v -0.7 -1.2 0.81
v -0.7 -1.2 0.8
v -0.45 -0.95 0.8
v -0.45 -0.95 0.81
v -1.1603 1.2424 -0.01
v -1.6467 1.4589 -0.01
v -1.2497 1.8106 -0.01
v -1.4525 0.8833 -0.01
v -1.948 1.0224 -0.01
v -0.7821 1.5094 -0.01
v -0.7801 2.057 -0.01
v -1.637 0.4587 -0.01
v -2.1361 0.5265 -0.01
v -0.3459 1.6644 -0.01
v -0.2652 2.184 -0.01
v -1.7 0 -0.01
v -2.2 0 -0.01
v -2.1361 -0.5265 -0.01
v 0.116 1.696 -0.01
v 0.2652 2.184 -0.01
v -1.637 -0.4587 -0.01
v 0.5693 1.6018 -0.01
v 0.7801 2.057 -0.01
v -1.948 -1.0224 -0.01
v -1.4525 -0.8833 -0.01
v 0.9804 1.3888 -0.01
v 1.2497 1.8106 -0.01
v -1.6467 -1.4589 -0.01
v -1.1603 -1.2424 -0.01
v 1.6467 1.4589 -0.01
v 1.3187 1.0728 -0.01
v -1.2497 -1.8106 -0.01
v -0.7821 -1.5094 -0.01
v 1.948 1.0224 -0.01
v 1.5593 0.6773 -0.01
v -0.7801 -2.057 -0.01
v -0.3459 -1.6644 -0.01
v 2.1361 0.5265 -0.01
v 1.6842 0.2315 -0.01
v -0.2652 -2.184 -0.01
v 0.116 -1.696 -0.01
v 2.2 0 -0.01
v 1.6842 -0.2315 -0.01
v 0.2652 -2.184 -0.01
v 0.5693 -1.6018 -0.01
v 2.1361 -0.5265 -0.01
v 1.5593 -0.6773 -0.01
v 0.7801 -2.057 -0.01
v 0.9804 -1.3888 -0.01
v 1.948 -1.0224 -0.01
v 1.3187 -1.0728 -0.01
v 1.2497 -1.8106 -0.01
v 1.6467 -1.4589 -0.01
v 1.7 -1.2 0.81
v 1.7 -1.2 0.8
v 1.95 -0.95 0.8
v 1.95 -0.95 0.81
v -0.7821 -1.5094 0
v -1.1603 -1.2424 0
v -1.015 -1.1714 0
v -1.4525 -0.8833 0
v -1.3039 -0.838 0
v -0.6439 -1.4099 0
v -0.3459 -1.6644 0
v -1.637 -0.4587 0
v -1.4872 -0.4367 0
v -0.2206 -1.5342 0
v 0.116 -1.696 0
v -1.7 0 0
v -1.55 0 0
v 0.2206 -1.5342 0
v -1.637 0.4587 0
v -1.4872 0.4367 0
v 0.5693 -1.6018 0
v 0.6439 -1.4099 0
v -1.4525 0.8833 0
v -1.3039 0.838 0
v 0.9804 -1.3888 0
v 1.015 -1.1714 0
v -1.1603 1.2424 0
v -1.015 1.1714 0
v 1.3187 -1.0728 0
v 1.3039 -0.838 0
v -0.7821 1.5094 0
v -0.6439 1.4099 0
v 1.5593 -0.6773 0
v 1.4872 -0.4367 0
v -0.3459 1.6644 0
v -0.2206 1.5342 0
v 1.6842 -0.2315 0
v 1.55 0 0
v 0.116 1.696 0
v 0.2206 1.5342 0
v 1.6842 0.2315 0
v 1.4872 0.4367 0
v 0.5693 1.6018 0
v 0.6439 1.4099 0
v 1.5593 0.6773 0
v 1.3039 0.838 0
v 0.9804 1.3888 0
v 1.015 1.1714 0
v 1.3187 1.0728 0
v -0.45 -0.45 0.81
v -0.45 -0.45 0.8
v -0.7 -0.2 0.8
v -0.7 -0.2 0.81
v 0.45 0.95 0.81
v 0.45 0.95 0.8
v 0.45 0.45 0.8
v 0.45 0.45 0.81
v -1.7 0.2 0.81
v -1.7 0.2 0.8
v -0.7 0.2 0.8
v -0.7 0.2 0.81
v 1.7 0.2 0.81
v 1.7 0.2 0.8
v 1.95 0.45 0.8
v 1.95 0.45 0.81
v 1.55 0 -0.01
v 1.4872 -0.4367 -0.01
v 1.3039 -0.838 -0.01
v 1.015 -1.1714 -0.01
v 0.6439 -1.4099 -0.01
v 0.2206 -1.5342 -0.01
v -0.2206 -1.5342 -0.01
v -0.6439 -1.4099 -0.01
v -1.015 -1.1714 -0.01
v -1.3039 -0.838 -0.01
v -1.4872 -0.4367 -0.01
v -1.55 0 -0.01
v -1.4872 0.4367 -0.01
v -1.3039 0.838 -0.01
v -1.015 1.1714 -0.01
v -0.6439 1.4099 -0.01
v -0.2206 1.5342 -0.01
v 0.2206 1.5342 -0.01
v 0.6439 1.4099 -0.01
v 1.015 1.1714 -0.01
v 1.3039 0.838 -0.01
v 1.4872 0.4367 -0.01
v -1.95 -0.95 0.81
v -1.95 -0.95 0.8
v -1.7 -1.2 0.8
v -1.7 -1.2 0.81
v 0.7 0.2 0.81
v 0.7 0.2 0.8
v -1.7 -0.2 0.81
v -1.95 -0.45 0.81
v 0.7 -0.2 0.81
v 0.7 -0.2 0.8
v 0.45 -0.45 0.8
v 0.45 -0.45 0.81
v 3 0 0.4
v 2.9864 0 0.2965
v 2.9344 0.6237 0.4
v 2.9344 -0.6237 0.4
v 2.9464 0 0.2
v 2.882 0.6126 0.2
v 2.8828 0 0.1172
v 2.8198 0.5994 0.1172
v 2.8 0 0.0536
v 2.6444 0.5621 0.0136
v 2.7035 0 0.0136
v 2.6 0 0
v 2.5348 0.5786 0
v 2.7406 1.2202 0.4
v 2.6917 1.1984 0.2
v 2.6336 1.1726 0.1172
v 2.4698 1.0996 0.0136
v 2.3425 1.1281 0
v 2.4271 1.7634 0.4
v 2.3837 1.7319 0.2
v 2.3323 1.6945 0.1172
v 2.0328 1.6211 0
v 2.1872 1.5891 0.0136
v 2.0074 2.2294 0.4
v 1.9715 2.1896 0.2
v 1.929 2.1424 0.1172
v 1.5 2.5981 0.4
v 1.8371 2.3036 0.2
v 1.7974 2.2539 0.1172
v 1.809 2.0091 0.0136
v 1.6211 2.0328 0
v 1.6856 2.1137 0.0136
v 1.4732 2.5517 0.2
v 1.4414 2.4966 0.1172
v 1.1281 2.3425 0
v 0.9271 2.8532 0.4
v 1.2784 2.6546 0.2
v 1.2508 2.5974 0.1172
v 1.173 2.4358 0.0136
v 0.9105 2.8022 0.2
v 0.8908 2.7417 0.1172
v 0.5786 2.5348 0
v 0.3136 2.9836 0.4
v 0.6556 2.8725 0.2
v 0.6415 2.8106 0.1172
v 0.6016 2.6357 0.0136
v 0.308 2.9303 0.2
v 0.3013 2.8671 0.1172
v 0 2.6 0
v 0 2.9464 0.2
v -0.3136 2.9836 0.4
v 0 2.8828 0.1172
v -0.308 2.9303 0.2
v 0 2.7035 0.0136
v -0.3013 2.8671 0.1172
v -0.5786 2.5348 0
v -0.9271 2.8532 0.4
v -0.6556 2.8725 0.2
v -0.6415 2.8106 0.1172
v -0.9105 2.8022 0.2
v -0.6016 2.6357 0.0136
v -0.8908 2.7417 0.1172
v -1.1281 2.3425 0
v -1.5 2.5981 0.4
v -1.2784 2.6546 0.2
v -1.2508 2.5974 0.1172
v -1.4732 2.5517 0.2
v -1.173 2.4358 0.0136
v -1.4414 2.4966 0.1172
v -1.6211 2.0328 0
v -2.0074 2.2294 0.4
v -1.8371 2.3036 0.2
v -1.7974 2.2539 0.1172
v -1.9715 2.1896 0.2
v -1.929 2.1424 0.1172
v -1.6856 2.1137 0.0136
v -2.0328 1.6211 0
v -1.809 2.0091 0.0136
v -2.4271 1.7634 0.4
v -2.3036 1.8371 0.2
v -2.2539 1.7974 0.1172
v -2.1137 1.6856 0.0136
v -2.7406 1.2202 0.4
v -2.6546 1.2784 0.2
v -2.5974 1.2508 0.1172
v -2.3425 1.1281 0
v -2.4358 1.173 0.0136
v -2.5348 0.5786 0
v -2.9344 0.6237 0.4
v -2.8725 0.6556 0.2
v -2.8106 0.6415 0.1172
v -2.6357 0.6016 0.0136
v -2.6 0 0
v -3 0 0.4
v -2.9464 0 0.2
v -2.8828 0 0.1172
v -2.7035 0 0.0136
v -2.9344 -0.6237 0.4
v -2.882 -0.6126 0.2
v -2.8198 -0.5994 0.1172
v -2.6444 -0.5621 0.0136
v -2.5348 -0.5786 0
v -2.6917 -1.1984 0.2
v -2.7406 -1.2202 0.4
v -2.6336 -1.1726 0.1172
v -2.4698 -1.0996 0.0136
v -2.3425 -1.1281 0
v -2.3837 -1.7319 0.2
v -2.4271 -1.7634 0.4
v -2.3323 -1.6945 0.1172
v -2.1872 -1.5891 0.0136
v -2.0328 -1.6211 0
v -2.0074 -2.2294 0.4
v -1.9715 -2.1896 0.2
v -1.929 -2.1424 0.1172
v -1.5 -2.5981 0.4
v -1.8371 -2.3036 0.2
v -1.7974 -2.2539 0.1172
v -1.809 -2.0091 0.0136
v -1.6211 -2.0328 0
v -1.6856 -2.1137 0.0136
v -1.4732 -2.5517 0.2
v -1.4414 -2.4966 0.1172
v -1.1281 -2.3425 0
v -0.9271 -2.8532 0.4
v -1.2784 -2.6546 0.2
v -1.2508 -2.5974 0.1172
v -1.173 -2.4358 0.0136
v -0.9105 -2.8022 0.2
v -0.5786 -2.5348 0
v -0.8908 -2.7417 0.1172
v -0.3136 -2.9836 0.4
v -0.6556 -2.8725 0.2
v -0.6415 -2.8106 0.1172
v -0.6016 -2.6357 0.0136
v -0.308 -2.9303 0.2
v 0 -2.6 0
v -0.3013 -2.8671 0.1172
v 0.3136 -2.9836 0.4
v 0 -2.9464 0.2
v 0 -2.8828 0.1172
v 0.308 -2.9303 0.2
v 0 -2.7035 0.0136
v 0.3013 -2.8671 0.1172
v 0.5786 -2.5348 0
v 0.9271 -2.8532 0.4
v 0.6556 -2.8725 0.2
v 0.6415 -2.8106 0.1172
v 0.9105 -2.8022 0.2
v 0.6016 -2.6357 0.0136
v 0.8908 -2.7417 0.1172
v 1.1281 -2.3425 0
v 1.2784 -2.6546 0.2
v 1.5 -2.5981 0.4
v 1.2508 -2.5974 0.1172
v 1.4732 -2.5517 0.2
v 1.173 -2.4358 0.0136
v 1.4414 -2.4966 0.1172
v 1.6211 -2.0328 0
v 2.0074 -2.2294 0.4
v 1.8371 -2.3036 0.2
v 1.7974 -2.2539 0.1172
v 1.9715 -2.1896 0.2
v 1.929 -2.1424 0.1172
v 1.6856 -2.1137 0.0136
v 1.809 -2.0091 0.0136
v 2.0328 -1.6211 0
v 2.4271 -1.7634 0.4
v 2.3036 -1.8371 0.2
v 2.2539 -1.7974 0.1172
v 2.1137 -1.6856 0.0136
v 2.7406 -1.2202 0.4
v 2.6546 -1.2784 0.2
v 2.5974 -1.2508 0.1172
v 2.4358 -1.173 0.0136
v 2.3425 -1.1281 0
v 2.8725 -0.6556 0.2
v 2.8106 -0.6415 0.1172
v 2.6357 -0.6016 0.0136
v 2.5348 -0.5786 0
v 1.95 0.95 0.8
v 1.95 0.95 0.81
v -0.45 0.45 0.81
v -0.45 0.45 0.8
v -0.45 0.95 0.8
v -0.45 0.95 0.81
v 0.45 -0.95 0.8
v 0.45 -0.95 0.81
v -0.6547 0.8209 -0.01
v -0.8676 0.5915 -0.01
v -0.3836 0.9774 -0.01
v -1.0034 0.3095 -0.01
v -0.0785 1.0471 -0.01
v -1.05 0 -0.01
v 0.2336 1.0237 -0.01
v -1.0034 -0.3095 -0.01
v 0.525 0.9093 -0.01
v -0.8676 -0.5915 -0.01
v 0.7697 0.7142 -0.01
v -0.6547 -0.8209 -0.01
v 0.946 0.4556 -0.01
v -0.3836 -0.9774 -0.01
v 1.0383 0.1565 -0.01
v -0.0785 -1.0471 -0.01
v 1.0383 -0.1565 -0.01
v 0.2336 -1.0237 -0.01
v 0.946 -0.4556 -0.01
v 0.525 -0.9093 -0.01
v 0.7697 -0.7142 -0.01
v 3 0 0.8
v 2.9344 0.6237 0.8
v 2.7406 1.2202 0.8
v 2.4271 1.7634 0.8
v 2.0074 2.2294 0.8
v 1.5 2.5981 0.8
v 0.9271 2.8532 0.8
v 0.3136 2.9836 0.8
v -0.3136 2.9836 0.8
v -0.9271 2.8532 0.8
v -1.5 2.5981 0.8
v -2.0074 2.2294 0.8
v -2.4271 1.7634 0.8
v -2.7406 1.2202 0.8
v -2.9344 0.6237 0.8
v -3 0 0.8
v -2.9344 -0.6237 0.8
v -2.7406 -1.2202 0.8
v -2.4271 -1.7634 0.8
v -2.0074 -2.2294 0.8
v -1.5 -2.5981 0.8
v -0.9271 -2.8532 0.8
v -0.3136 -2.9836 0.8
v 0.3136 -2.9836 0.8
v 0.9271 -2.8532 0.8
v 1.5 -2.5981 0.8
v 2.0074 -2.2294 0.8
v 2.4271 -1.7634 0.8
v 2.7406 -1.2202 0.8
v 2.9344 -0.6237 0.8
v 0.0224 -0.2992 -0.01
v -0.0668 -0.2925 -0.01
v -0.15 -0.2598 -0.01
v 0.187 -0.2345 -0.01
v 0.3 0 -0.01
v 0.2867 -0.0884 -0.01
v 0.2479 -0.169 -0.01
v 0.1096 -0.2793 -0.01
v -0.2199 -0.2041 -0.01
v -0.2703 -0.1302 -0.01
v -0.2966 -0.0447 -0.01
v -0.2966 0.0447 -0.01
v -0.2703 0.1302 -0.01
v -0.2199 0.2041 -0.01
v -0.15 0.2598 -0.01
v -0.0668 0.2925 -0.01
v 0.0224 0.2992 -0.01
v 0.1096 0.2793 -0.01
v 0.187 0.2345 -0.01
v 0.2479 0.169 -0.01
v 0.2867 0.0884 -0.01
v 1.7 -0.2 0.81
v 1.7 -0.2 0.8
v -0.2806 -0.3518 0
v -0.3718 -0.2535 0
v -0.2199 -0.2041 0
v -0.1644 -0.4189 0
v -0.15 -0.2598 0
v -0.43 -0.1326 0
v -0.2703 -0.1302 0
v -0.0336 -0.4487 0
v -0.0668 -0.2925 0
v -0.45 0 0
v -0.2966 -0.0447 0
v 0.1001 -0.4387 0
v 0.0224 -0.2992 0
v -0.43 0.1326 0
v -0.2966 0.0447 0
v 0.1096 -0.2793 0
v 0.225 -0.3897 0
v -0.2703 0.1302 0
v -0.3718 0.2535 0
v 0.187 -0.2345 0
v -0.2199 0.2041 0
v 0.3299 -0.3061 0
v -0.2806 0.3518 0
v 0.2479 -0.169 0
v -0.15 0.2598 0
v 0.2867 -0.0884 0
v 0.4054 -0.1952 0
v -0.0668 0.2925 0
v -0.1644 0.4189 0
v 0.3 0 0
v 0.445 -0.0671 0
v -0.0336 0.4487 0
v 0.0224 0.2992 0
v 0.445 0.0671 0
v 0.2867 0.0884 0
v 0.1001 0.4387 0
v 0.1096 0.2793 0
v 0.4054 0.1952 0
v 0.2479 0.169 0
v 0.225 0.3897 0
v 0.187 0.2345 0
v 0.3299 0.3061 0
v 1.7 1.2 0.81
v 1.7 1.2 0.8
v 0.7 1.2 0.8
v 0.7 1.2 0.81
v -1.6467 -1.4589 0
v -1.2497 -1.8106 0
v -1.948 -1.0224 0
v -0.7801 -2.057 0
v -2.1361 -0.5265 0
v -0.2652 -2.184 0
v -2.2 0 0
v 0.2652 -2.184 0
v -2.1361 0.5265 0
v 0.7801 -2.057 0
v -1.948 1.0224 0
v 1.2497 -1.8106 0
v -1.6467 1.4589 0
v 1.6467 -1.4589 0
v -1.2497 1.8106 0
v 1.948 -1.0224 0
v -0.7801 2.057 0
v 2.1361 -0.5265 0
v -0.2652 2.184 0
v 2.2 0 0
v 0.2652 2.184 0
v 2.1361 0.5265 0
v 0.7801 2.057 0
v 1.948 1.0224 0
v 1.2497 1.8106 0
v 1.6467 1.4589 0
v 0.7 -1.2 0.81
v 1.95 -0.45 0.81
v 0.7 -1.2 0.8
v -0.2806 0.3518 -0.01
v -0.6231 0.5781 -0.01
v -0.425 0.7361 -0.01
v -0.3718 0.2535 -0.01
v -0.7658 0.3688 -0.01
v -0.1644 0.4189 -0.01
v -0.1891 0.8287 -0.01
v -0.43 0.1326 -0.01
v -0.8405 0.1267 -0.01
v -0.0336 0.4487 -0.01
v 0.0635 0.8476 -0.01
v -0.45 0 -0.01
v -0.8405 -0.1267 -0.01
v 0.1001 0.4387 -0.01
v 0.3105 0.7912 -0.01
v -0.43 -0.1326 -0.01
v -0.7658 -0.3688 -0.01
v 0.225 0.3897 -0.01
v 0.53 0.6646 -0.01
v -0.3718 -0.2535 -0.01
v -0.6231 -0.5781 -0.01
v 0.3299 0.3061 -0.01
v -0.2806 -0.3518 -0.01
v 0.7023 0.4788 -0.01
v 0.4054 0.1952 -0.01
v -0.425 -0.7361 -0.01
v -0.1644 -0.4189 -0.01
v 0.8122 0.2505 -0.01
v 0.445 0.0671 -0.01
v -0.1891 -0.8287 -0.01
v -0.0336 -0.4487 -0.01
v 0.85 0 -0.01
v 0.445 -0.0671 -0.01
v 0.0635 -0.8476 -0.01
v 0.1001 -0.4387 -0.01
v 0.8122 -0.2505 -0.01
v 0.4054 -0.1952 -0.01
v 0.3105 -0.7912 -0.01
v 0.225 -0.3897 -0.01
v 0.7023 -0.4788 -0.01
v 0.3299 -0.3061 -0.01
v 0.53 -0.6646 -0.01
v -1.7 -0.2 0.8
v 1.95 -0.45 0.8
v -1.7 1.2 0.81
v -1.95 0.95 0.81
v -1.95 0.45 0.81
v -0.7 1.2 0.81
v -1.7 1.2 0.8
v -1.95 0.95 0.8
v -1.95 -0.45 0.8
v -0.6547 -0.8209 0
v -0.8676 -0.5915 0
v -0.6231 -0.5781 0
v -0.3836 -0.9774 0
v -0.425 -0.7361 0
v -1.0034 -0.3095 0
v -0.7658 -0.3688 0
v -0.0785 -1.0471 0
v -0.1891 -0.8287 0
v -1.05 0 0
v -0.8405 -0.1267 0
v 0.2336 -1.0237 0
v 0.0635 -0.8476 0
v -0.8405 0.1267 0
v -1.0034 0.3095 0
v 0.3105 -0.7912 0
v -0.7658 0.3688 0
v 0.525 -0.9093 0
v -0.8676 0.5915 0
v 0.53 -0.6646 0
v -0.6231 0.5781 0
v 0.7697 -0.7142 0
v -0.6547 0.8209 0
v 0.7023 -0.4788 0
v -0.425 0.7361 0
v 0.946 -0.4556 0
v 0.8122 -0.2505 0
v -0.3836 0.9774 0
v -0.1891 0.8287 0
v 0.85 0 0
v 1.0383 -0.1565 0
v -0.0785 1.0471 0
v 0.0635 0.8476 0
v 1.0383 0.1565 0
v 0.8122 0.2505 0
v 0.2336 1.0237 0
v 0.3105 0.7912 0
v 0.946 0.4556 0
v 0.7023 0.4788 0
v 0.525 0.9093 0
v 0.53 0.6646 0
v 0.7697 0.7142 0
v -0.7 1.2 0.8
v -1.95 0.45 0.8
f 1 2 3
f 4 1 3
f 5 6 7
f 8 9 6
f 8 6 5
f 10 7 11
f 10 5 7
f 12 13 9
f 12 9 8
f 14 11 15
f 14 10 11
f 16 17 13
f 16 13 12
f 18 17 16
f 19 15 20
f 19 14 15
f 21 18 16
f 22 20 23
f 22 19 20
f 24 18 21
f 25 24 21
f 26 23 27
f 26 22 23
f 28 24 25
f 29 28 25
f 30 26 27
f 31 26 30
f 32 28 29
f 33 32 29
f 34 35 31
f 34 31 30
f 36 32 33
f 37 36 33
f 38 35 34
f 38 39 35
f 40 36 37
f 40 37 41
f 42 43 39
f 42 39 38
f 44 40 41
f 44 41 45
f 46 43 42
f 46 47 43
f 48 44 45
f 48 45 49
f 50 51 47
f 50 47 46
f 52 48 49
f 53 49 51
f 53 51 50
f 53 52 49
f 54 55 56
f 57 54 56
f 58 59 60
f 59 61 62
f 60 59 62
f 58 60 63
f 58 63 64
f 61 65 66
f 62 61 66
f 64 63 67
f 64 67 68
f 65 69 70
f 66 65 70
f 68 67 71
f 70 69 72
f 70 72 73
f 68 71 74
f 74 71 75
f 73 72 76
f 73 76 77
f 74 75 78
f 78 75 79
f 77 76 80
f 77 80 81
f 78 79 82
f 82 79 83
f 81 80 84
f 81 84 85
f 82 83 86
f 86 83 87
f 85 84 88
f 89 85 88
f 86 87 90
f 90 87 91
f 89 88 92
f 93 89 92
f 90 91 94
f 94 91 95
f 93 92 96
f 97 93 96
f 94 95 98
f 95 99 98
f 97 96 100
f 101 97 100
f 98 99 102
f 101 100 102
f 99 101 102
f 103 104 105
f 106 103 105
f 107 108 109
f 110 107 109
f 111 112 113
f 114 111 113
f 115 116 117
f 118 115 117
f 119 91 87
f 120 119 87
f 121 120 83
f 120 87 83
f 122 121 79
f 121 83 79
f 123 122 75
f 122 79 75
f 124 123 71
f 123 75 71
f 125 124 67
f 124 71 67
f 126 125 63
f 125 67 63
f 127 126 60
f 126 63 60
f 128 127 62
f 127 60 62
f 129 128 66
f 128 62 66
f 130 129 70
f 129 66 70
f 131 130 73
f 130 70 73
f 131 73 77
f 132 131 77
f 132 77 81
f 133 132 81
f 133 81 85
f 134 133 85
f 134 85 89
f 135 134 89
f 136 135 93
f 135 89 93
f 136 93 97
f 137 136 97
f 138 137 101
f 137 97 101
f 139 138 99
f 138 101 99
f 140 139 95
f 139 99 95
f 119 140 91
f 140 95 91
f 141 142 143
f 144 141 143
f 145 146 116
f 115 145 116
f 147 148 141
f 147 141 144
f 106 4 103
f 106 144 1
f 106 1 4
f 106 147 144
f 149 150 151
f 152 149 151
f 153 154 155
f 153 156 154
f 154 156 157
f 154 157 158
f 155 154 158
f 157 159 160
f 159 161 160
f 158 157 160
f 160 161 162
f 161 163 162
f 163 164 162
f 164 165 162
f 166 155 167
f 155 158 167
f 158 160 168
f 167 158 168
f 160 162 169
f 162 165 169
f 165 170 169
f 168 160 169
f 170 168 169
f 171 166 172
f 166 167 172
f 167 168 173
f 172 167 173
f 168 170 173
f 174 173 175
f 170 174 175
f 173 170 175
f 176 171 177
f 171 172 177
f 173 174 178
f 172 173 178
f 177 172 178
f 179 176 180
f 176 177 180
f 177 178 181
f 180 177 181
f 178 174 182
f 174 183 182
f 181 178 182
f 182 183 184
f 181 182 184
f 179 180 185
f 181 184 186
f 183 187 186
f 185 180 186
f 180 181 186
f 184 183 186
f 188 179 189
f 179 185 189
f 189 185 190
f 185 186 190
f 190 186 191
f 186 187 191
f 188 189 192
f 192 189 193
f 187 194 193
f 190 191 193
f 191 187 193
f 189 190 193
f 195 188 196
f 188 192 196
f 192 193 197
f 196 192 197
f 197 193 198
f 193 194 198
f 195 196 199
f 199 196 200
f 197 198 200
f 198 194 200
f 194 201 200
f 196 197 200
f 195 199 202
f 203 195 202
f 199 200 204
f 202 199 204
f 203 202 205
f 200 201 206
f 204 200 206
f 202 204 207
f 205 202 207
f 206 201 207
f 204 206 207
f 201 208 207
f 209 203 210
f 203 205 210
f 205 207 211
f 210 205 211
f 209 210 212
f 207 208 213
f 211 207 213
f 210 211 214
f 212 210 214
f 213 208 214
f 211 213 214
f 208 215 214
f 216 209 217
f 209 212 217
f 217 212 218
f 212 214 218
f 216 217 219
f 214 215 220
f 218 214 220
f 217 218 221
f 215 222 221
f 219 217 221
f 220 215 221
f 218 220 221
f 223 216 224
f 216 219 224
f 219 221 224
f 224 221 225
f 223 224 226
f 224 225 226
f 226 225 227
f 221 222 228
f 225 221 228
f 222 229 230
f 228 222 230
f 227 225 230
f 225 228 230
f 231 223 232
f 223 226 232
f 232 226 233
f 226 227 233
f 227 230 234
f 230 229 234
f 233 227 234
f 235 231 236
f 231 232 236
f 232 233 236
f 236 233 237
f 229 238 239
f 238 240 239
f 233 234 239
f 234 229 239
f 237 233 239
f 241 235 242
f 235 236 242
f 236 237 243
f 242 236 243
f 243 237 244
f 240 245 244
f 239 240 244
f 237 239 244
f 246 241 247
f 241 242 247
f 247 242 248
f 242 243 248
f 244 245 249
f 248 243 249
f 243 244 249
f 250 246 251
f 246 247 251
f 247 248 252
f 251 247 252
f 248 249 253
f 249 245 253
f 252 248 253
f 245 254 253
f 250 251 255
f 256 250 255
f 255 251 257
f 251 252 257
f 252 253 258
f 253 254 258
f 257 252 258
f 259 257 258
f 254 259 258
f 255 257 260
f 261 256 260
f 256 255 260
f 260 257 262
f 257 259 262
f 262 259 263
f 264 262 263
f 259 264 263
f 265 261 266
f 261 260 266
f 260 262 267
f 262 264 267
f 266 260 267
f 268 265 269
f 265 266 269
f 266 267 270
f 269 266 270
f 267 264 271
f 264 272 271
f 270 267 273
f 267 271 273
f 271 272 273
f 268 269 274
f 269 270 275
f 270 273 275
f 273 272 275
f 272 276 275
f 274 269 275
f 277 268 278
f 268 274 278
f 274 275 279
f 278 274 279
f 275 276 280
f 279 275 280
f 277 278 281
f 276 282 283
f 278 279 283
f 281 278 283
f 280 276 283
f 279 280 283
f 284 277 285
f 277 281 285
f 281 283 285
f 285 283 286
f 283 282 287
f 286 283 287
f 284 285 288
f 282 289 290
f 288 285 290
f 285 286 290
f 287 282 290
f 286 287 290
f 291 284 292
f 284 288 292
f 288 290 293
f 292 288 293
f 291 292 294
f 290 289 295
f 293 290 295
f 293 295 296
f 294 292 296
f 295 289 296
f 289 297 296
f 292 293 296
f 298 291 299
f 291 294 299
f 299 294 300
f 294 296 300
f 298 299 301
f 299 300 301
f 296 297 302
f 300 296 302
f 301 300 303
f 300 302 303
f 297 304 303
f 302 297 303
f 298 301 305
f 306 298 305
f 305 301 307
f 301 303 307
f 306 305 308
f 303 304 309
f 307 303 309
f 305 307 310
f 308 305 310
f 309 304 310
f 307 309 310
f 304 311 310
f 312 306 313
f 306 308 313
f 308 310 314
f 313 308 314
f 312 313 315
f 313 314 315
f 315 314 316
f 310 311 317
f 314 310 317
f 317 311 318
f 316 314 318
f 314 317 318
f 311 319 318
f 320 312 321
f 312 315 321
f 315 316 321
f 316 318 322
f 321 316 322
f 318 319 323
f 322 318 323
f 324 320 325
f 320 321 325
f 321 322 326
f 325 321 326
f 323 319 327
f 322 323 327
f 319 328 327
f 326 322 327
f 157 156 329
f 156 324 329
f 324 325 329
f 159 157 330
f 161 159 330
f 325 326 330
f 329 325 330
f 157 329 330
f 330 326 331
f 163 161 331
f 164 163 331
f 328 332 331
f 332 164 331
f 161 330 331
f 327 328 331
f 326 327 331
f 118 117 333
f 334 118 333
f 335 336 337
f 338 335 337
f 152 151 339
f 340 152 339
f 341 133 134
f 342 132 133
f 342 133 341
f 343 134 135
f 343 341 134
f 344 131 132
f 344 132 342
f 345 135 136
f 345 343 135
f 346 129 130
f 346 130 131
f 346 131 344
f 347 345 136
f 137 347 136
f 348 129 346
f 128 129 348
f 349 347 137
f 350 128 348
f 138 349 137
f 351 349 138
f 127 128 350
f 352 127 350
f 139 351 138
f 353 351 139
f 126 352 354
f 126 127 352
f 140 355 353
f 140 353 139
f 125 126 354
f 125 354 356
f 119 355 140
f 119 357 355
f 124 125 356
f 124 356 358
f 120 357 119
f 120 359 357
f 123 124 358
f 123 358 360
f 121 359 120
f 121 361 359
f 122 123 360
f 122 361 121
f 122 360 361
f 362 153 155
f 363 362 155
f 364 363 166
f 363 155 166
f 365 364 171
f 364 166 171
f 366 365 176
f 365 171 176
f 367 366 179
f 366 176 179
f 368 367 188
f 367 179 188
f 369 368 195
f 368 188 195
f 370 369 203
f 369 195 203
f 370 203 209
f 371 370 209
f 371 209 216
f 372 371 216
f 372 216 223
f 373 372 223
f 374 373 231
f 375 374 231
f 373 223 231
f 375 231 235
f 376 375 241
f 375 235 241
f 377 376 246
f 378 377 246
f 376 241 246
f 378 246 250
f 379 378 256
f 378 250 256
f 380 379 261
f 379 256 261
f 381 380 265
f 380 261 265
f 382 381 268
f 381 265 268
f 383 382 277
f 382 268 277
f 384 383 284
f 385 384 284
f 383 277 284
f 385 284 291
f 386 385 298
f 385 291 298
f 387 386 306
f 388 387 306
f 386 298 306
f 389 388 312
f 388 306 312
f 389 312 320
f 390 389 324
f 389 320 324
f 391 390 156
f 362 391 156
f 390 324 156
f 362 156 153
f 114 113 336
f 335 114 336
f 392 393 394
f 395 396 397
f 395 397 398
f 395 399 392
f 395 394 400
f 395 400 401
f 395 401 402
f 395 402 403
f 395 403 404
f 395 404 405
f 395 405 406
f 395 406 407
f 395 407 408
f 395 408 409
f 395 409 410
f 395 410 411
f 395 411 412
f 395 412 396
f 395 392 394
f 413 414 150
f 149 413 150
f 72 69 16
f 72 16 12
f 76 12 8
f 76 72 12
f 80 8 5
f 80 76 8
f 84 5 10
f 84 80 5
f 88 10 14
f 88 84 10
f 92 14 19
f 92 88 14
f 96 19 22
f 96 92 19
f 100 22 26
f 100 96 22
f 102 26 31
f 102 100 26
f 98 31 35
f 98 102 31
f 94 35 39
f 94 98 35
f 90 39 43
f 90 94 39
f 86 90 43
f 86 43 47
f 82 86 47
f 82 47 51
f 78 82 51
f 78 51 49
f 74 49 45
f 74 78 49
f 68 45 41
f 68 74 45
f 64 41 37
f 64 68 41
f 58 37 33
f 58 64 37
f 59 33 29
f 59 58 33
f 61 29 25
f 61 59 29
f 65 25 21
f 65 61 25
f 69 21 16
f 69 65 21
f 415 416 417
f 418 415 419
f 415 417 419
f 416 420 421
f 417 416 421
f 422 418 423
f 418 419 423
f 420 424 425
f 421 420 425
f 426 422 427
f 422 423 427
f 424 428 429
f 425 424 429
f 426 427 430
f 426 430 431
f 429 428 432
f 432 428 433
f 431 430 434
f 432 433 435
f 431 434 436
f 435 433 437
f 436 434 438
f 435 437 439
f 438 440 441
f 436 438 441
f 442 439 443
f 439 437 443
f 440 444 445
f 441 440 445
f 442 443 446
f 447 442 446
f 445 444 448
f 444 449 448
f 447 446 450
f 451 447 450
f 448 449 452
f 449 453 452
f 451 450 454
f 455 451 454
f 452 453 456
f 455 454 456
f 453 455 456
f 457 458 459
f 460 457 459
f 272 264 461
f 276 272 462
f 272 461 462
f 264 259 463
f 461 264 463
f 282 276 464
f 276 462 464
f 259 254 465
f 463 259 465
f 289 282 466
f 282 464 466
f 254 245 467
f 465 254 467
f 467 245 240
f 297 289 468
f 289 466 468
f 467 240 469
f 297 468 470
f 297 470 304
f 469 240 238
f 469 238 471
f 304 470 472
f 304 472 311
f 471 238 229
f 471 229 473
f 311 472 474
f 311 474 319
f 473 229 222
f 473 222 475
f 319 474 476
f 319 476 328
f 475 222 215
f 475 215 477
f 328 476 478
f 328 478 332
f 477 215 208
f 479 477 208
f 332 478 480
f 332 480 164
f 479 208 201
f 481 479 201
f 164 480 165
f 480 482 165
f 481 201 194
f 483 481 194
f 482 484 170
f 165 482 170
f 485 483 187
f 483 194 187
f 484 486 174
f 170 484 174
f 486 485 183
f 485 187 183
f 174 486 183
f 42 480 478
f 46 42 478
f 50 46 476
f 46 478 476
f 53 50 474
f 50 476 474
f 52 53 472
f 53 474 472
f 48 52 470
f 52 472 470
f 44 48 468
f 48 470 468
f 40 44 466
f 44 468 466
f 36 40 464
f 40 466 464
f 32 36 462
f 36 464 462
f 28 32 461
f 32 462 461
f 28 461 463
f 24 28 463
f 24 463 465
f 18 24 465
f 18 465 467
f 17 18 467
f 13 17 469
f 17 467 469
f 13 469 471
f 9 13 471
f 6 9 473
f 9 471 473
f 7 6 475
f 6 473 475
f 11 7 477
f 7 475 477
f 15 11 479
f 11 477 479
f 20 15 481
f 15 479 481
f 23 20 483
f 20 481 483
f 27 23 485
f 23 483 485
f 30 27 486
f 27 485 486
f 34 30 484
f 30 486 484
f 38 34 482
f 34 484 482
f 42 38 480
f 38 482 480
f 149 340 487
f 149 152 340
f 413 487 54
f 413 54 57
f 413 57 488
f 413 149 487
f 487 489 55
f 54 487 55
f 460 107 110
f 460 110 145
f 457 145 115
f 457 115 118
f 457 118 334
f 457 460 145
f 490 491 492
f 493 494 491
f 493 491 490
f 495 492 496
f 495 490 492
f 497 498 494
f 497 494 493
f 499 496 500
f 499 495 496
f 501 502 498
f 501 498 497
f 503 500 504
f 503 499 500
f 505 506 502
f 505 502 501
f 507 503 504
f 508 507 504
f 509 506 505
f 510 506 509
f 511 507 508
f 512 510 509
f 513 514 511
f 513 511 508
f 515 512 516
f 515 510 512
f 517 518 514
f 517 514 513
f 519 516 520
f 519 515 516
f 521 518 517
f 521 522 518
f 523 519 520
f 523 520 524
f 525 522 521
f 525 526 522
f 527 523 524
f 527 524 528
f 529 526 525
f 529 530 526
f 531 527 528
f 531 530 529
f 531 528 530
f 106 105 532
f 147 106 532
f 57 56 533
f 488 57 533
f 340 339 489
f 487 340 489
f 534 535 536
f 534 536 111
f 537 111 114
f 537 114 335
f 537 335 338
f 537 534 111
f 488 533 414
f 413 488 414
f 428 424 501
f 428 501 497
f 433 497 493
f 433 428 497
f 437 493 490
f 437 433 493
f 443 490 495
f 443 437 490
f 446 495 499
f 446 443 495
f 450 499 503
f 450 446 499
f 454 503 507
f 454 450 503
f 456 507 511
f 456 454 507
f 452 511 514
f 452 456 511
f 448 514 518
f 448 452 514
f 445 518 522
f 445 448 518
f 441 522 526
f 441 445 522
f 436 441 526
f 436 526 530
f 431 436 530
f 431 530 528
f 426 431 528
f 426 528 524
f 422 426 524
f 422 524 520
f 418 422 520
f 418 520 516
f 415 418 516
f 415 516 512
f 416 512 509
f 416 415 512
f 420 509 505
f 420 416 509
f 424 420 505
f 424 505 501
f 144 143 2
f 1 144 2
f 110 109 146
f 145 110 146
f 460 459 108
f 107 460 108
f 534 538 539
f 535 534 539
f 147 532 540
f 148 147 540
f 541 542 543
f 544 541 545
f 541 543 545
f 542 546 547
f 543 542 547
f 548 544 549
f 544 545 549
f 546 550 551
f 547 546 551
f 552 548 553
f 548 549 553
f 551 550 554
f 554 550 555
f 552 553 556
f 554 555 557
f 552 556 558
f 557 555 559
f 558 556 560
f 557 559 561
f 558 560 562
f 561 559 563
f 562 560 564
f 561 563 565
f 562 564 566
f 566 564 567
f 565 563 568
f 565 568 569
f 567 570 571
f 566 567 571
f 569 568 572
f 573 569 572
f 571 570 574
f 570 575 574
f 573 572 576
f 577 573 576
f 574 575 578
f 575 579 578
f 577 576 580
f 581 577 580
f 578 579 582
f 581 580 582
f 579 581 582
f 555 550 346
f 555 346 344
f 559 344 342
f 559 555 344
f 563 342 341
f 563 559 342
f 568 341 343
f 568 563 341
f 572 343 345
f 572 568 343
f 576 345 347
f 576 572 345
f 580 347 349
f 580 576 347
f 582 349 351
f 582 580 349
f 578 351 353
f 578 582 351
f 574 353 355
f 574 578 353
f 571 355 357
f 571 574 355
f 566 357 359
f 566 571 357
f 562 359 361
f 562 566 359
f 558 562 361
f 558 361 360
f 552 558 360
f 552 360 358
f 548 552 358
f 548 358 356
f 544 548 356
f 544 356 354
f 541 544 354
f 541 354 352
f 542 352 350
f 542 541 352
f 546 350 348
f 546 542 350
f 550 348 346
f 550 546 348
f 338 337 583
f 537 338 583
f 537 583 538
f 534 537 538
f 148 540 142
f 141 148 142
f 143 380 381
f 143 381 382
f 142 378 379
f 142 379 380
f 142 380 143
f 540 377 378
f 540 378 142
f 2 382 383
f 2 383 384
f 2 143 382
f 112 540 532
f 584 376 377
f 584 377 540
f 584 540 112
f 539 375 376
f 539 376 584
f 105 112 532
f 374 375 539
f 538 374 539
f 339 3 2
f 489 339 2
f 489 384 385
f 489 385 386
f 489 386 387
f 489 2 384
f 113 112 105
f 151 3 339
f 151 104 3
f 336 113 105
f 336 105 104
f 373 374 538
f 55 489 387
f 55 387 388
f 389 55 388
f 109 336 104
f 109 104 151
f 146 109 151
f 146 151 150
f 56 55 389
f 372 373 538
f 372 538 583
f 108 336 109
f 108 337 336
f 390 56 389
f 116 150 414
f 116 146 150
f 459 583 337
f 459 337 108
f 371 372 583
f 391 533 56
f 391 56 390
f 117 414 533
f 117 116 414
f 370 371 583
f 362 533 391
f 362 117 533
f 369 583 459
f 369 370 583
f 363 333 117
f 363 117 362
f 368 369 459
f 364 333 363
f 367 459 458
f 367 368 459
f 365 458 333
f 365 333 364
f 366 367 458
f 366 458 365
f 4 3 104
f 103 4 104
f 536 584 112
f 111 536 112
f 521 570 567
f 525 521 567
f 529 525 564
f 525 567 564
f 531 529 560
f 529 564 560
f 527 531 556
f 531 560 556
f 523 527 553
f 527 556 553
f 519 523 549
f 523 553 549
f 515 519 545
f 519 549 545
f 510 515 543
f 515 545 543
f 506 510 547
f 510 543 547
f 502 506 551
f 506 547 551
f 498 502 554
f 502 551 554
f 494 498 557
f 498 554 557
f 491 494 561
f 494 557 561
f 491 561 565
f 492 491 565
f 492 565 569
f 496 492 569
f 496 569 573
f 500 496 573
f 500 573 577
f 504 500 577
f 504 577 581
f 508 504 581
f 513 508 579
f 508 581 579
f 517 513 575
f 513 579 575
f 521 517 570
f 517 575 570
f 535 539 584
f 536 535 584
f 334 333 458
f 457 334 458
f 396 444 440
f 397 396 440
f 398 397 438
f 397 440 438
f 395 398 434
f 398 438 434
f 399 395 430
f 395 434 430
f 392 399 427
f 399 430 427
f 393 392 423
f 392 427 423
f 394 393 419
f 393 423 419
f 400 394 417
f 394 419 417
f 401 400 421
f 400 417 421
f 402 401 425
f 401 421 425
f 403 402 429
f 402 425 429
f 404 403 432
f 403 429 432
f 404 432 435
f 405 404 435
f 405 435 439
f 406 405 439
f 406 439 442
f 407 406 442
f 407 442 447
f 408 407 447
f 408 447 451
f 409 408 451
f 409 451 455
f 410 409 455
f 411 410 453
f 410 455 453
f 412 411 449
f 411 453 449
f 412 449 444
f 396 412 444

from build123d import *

# Parameters (mm, degrees)
SKETCH_1_R      = 3
EXTRUDE_1_DEPTH = 0.8
SKETCH_2_R      = 2.2
SKETCH_2_R_2    = 1.7
SKETCH_2_R_3    = 1.55
SKETCH_2_R_4    = 1.05
SKETCH_2_R_5    = 0.85
SKETCH_2_R_6    = 0.45
SKETCH_2_R_7    = 0.3
EXTRUDE_2_DEPTH = 0.01
EXTRUDE_3_DEPTH = 0.01
FILLET_2_R      = 0.4


with BuildPart() as part:
    # 草图1 → 凸台-拉伸1 (new body)
    with BuildSketch(Plane.XY):
        Circle(SKETCH_1_R)
    extrude(amount=EXTRUDE_1_DEPTH)

    # 草图2 → 凸台-拉伸2 (add)
    with BuildSketch(Plane(origin=(0, 0, 0), x_dir=(-1, 0, 0), z_dir=(0, 0, -1))):
        with Locations(Location((0, 0, 0), (0, 0, 180))):  # turned: the seam where the file's is
            Circle(SKETCH_2_R)
        Circle(SKETCH_2_R_2, mode=Mode.SUBTRACT)
        with Locations(Location((0, 0, 0), (0, 0, 180))):  # turned: the seam where the file's is
            Circle(SKETCH_2_R_3)
        Circle(SKETCH_2_R_4, mode=Mode.SUBTRACT)
        with Locations(Location((0, 0, 0), (0, 0, 180))):  # turned: the seam where the file's is
            Circle(SKETCH_2_R_5)
        Circle(SKETCH_2_R_6, mode=Mode.SUBTRACT)
        with Locations(Location((0, 0, 0), (0, 0, 180))):  # turned: the seam where the file's is
            Circle(SKETCH_2_R_7)
    extrude(amount=EXTRUDE_2_DEPTH)

    # 草图3 → 凸台-拉伸3 (add)
    with BuildSketch(Plane.XY.offset(0.8)):
        Polygon((-0.45, 0.95), (-0.7, 1.2), (-1.7, 1.2), (-1.95, 0.95), (-1.95, 0.45), (-1.7, 0.2), (-0.7, 0.2), (-0.45, 0.45), align=None)
        Polygon((0.45, 0.95), (0.45, 0.45), (0.7, 0.2), (1.7, 0.2), (1.95, 0.45), (1.95, 0.95), (1.7, 1.2), (0.7, 1.2), align=None)
        Polygon((0.45, -0.95), (0.7, -1.2), (1.7, -1.2), (1.95, -0.95), (1.95, -0.45), (1.7, -0.2), (0.7, -0.2), (0.45, -0.45), align=None)
        Polygon((-0.45, -0.95), (-0.45, -0.45), (-0.7, -0.2), (-1.7, -0.2), (-1.95, -0.45), (-1.95, -0.95), (-1.7, -1.2), (-0.7, -1.2), align=None)
    extrude(amount=EXTRUDE_3_DEPTH)

    # 圆角2
    fillet_2_edges = [part.edges().sort_by_distance(p)[0] for p in [
        (-3, 0, 0),
    ]]
    fillet(fillet_2_edges, radius=FILLET_2_R)


solid = part.part
